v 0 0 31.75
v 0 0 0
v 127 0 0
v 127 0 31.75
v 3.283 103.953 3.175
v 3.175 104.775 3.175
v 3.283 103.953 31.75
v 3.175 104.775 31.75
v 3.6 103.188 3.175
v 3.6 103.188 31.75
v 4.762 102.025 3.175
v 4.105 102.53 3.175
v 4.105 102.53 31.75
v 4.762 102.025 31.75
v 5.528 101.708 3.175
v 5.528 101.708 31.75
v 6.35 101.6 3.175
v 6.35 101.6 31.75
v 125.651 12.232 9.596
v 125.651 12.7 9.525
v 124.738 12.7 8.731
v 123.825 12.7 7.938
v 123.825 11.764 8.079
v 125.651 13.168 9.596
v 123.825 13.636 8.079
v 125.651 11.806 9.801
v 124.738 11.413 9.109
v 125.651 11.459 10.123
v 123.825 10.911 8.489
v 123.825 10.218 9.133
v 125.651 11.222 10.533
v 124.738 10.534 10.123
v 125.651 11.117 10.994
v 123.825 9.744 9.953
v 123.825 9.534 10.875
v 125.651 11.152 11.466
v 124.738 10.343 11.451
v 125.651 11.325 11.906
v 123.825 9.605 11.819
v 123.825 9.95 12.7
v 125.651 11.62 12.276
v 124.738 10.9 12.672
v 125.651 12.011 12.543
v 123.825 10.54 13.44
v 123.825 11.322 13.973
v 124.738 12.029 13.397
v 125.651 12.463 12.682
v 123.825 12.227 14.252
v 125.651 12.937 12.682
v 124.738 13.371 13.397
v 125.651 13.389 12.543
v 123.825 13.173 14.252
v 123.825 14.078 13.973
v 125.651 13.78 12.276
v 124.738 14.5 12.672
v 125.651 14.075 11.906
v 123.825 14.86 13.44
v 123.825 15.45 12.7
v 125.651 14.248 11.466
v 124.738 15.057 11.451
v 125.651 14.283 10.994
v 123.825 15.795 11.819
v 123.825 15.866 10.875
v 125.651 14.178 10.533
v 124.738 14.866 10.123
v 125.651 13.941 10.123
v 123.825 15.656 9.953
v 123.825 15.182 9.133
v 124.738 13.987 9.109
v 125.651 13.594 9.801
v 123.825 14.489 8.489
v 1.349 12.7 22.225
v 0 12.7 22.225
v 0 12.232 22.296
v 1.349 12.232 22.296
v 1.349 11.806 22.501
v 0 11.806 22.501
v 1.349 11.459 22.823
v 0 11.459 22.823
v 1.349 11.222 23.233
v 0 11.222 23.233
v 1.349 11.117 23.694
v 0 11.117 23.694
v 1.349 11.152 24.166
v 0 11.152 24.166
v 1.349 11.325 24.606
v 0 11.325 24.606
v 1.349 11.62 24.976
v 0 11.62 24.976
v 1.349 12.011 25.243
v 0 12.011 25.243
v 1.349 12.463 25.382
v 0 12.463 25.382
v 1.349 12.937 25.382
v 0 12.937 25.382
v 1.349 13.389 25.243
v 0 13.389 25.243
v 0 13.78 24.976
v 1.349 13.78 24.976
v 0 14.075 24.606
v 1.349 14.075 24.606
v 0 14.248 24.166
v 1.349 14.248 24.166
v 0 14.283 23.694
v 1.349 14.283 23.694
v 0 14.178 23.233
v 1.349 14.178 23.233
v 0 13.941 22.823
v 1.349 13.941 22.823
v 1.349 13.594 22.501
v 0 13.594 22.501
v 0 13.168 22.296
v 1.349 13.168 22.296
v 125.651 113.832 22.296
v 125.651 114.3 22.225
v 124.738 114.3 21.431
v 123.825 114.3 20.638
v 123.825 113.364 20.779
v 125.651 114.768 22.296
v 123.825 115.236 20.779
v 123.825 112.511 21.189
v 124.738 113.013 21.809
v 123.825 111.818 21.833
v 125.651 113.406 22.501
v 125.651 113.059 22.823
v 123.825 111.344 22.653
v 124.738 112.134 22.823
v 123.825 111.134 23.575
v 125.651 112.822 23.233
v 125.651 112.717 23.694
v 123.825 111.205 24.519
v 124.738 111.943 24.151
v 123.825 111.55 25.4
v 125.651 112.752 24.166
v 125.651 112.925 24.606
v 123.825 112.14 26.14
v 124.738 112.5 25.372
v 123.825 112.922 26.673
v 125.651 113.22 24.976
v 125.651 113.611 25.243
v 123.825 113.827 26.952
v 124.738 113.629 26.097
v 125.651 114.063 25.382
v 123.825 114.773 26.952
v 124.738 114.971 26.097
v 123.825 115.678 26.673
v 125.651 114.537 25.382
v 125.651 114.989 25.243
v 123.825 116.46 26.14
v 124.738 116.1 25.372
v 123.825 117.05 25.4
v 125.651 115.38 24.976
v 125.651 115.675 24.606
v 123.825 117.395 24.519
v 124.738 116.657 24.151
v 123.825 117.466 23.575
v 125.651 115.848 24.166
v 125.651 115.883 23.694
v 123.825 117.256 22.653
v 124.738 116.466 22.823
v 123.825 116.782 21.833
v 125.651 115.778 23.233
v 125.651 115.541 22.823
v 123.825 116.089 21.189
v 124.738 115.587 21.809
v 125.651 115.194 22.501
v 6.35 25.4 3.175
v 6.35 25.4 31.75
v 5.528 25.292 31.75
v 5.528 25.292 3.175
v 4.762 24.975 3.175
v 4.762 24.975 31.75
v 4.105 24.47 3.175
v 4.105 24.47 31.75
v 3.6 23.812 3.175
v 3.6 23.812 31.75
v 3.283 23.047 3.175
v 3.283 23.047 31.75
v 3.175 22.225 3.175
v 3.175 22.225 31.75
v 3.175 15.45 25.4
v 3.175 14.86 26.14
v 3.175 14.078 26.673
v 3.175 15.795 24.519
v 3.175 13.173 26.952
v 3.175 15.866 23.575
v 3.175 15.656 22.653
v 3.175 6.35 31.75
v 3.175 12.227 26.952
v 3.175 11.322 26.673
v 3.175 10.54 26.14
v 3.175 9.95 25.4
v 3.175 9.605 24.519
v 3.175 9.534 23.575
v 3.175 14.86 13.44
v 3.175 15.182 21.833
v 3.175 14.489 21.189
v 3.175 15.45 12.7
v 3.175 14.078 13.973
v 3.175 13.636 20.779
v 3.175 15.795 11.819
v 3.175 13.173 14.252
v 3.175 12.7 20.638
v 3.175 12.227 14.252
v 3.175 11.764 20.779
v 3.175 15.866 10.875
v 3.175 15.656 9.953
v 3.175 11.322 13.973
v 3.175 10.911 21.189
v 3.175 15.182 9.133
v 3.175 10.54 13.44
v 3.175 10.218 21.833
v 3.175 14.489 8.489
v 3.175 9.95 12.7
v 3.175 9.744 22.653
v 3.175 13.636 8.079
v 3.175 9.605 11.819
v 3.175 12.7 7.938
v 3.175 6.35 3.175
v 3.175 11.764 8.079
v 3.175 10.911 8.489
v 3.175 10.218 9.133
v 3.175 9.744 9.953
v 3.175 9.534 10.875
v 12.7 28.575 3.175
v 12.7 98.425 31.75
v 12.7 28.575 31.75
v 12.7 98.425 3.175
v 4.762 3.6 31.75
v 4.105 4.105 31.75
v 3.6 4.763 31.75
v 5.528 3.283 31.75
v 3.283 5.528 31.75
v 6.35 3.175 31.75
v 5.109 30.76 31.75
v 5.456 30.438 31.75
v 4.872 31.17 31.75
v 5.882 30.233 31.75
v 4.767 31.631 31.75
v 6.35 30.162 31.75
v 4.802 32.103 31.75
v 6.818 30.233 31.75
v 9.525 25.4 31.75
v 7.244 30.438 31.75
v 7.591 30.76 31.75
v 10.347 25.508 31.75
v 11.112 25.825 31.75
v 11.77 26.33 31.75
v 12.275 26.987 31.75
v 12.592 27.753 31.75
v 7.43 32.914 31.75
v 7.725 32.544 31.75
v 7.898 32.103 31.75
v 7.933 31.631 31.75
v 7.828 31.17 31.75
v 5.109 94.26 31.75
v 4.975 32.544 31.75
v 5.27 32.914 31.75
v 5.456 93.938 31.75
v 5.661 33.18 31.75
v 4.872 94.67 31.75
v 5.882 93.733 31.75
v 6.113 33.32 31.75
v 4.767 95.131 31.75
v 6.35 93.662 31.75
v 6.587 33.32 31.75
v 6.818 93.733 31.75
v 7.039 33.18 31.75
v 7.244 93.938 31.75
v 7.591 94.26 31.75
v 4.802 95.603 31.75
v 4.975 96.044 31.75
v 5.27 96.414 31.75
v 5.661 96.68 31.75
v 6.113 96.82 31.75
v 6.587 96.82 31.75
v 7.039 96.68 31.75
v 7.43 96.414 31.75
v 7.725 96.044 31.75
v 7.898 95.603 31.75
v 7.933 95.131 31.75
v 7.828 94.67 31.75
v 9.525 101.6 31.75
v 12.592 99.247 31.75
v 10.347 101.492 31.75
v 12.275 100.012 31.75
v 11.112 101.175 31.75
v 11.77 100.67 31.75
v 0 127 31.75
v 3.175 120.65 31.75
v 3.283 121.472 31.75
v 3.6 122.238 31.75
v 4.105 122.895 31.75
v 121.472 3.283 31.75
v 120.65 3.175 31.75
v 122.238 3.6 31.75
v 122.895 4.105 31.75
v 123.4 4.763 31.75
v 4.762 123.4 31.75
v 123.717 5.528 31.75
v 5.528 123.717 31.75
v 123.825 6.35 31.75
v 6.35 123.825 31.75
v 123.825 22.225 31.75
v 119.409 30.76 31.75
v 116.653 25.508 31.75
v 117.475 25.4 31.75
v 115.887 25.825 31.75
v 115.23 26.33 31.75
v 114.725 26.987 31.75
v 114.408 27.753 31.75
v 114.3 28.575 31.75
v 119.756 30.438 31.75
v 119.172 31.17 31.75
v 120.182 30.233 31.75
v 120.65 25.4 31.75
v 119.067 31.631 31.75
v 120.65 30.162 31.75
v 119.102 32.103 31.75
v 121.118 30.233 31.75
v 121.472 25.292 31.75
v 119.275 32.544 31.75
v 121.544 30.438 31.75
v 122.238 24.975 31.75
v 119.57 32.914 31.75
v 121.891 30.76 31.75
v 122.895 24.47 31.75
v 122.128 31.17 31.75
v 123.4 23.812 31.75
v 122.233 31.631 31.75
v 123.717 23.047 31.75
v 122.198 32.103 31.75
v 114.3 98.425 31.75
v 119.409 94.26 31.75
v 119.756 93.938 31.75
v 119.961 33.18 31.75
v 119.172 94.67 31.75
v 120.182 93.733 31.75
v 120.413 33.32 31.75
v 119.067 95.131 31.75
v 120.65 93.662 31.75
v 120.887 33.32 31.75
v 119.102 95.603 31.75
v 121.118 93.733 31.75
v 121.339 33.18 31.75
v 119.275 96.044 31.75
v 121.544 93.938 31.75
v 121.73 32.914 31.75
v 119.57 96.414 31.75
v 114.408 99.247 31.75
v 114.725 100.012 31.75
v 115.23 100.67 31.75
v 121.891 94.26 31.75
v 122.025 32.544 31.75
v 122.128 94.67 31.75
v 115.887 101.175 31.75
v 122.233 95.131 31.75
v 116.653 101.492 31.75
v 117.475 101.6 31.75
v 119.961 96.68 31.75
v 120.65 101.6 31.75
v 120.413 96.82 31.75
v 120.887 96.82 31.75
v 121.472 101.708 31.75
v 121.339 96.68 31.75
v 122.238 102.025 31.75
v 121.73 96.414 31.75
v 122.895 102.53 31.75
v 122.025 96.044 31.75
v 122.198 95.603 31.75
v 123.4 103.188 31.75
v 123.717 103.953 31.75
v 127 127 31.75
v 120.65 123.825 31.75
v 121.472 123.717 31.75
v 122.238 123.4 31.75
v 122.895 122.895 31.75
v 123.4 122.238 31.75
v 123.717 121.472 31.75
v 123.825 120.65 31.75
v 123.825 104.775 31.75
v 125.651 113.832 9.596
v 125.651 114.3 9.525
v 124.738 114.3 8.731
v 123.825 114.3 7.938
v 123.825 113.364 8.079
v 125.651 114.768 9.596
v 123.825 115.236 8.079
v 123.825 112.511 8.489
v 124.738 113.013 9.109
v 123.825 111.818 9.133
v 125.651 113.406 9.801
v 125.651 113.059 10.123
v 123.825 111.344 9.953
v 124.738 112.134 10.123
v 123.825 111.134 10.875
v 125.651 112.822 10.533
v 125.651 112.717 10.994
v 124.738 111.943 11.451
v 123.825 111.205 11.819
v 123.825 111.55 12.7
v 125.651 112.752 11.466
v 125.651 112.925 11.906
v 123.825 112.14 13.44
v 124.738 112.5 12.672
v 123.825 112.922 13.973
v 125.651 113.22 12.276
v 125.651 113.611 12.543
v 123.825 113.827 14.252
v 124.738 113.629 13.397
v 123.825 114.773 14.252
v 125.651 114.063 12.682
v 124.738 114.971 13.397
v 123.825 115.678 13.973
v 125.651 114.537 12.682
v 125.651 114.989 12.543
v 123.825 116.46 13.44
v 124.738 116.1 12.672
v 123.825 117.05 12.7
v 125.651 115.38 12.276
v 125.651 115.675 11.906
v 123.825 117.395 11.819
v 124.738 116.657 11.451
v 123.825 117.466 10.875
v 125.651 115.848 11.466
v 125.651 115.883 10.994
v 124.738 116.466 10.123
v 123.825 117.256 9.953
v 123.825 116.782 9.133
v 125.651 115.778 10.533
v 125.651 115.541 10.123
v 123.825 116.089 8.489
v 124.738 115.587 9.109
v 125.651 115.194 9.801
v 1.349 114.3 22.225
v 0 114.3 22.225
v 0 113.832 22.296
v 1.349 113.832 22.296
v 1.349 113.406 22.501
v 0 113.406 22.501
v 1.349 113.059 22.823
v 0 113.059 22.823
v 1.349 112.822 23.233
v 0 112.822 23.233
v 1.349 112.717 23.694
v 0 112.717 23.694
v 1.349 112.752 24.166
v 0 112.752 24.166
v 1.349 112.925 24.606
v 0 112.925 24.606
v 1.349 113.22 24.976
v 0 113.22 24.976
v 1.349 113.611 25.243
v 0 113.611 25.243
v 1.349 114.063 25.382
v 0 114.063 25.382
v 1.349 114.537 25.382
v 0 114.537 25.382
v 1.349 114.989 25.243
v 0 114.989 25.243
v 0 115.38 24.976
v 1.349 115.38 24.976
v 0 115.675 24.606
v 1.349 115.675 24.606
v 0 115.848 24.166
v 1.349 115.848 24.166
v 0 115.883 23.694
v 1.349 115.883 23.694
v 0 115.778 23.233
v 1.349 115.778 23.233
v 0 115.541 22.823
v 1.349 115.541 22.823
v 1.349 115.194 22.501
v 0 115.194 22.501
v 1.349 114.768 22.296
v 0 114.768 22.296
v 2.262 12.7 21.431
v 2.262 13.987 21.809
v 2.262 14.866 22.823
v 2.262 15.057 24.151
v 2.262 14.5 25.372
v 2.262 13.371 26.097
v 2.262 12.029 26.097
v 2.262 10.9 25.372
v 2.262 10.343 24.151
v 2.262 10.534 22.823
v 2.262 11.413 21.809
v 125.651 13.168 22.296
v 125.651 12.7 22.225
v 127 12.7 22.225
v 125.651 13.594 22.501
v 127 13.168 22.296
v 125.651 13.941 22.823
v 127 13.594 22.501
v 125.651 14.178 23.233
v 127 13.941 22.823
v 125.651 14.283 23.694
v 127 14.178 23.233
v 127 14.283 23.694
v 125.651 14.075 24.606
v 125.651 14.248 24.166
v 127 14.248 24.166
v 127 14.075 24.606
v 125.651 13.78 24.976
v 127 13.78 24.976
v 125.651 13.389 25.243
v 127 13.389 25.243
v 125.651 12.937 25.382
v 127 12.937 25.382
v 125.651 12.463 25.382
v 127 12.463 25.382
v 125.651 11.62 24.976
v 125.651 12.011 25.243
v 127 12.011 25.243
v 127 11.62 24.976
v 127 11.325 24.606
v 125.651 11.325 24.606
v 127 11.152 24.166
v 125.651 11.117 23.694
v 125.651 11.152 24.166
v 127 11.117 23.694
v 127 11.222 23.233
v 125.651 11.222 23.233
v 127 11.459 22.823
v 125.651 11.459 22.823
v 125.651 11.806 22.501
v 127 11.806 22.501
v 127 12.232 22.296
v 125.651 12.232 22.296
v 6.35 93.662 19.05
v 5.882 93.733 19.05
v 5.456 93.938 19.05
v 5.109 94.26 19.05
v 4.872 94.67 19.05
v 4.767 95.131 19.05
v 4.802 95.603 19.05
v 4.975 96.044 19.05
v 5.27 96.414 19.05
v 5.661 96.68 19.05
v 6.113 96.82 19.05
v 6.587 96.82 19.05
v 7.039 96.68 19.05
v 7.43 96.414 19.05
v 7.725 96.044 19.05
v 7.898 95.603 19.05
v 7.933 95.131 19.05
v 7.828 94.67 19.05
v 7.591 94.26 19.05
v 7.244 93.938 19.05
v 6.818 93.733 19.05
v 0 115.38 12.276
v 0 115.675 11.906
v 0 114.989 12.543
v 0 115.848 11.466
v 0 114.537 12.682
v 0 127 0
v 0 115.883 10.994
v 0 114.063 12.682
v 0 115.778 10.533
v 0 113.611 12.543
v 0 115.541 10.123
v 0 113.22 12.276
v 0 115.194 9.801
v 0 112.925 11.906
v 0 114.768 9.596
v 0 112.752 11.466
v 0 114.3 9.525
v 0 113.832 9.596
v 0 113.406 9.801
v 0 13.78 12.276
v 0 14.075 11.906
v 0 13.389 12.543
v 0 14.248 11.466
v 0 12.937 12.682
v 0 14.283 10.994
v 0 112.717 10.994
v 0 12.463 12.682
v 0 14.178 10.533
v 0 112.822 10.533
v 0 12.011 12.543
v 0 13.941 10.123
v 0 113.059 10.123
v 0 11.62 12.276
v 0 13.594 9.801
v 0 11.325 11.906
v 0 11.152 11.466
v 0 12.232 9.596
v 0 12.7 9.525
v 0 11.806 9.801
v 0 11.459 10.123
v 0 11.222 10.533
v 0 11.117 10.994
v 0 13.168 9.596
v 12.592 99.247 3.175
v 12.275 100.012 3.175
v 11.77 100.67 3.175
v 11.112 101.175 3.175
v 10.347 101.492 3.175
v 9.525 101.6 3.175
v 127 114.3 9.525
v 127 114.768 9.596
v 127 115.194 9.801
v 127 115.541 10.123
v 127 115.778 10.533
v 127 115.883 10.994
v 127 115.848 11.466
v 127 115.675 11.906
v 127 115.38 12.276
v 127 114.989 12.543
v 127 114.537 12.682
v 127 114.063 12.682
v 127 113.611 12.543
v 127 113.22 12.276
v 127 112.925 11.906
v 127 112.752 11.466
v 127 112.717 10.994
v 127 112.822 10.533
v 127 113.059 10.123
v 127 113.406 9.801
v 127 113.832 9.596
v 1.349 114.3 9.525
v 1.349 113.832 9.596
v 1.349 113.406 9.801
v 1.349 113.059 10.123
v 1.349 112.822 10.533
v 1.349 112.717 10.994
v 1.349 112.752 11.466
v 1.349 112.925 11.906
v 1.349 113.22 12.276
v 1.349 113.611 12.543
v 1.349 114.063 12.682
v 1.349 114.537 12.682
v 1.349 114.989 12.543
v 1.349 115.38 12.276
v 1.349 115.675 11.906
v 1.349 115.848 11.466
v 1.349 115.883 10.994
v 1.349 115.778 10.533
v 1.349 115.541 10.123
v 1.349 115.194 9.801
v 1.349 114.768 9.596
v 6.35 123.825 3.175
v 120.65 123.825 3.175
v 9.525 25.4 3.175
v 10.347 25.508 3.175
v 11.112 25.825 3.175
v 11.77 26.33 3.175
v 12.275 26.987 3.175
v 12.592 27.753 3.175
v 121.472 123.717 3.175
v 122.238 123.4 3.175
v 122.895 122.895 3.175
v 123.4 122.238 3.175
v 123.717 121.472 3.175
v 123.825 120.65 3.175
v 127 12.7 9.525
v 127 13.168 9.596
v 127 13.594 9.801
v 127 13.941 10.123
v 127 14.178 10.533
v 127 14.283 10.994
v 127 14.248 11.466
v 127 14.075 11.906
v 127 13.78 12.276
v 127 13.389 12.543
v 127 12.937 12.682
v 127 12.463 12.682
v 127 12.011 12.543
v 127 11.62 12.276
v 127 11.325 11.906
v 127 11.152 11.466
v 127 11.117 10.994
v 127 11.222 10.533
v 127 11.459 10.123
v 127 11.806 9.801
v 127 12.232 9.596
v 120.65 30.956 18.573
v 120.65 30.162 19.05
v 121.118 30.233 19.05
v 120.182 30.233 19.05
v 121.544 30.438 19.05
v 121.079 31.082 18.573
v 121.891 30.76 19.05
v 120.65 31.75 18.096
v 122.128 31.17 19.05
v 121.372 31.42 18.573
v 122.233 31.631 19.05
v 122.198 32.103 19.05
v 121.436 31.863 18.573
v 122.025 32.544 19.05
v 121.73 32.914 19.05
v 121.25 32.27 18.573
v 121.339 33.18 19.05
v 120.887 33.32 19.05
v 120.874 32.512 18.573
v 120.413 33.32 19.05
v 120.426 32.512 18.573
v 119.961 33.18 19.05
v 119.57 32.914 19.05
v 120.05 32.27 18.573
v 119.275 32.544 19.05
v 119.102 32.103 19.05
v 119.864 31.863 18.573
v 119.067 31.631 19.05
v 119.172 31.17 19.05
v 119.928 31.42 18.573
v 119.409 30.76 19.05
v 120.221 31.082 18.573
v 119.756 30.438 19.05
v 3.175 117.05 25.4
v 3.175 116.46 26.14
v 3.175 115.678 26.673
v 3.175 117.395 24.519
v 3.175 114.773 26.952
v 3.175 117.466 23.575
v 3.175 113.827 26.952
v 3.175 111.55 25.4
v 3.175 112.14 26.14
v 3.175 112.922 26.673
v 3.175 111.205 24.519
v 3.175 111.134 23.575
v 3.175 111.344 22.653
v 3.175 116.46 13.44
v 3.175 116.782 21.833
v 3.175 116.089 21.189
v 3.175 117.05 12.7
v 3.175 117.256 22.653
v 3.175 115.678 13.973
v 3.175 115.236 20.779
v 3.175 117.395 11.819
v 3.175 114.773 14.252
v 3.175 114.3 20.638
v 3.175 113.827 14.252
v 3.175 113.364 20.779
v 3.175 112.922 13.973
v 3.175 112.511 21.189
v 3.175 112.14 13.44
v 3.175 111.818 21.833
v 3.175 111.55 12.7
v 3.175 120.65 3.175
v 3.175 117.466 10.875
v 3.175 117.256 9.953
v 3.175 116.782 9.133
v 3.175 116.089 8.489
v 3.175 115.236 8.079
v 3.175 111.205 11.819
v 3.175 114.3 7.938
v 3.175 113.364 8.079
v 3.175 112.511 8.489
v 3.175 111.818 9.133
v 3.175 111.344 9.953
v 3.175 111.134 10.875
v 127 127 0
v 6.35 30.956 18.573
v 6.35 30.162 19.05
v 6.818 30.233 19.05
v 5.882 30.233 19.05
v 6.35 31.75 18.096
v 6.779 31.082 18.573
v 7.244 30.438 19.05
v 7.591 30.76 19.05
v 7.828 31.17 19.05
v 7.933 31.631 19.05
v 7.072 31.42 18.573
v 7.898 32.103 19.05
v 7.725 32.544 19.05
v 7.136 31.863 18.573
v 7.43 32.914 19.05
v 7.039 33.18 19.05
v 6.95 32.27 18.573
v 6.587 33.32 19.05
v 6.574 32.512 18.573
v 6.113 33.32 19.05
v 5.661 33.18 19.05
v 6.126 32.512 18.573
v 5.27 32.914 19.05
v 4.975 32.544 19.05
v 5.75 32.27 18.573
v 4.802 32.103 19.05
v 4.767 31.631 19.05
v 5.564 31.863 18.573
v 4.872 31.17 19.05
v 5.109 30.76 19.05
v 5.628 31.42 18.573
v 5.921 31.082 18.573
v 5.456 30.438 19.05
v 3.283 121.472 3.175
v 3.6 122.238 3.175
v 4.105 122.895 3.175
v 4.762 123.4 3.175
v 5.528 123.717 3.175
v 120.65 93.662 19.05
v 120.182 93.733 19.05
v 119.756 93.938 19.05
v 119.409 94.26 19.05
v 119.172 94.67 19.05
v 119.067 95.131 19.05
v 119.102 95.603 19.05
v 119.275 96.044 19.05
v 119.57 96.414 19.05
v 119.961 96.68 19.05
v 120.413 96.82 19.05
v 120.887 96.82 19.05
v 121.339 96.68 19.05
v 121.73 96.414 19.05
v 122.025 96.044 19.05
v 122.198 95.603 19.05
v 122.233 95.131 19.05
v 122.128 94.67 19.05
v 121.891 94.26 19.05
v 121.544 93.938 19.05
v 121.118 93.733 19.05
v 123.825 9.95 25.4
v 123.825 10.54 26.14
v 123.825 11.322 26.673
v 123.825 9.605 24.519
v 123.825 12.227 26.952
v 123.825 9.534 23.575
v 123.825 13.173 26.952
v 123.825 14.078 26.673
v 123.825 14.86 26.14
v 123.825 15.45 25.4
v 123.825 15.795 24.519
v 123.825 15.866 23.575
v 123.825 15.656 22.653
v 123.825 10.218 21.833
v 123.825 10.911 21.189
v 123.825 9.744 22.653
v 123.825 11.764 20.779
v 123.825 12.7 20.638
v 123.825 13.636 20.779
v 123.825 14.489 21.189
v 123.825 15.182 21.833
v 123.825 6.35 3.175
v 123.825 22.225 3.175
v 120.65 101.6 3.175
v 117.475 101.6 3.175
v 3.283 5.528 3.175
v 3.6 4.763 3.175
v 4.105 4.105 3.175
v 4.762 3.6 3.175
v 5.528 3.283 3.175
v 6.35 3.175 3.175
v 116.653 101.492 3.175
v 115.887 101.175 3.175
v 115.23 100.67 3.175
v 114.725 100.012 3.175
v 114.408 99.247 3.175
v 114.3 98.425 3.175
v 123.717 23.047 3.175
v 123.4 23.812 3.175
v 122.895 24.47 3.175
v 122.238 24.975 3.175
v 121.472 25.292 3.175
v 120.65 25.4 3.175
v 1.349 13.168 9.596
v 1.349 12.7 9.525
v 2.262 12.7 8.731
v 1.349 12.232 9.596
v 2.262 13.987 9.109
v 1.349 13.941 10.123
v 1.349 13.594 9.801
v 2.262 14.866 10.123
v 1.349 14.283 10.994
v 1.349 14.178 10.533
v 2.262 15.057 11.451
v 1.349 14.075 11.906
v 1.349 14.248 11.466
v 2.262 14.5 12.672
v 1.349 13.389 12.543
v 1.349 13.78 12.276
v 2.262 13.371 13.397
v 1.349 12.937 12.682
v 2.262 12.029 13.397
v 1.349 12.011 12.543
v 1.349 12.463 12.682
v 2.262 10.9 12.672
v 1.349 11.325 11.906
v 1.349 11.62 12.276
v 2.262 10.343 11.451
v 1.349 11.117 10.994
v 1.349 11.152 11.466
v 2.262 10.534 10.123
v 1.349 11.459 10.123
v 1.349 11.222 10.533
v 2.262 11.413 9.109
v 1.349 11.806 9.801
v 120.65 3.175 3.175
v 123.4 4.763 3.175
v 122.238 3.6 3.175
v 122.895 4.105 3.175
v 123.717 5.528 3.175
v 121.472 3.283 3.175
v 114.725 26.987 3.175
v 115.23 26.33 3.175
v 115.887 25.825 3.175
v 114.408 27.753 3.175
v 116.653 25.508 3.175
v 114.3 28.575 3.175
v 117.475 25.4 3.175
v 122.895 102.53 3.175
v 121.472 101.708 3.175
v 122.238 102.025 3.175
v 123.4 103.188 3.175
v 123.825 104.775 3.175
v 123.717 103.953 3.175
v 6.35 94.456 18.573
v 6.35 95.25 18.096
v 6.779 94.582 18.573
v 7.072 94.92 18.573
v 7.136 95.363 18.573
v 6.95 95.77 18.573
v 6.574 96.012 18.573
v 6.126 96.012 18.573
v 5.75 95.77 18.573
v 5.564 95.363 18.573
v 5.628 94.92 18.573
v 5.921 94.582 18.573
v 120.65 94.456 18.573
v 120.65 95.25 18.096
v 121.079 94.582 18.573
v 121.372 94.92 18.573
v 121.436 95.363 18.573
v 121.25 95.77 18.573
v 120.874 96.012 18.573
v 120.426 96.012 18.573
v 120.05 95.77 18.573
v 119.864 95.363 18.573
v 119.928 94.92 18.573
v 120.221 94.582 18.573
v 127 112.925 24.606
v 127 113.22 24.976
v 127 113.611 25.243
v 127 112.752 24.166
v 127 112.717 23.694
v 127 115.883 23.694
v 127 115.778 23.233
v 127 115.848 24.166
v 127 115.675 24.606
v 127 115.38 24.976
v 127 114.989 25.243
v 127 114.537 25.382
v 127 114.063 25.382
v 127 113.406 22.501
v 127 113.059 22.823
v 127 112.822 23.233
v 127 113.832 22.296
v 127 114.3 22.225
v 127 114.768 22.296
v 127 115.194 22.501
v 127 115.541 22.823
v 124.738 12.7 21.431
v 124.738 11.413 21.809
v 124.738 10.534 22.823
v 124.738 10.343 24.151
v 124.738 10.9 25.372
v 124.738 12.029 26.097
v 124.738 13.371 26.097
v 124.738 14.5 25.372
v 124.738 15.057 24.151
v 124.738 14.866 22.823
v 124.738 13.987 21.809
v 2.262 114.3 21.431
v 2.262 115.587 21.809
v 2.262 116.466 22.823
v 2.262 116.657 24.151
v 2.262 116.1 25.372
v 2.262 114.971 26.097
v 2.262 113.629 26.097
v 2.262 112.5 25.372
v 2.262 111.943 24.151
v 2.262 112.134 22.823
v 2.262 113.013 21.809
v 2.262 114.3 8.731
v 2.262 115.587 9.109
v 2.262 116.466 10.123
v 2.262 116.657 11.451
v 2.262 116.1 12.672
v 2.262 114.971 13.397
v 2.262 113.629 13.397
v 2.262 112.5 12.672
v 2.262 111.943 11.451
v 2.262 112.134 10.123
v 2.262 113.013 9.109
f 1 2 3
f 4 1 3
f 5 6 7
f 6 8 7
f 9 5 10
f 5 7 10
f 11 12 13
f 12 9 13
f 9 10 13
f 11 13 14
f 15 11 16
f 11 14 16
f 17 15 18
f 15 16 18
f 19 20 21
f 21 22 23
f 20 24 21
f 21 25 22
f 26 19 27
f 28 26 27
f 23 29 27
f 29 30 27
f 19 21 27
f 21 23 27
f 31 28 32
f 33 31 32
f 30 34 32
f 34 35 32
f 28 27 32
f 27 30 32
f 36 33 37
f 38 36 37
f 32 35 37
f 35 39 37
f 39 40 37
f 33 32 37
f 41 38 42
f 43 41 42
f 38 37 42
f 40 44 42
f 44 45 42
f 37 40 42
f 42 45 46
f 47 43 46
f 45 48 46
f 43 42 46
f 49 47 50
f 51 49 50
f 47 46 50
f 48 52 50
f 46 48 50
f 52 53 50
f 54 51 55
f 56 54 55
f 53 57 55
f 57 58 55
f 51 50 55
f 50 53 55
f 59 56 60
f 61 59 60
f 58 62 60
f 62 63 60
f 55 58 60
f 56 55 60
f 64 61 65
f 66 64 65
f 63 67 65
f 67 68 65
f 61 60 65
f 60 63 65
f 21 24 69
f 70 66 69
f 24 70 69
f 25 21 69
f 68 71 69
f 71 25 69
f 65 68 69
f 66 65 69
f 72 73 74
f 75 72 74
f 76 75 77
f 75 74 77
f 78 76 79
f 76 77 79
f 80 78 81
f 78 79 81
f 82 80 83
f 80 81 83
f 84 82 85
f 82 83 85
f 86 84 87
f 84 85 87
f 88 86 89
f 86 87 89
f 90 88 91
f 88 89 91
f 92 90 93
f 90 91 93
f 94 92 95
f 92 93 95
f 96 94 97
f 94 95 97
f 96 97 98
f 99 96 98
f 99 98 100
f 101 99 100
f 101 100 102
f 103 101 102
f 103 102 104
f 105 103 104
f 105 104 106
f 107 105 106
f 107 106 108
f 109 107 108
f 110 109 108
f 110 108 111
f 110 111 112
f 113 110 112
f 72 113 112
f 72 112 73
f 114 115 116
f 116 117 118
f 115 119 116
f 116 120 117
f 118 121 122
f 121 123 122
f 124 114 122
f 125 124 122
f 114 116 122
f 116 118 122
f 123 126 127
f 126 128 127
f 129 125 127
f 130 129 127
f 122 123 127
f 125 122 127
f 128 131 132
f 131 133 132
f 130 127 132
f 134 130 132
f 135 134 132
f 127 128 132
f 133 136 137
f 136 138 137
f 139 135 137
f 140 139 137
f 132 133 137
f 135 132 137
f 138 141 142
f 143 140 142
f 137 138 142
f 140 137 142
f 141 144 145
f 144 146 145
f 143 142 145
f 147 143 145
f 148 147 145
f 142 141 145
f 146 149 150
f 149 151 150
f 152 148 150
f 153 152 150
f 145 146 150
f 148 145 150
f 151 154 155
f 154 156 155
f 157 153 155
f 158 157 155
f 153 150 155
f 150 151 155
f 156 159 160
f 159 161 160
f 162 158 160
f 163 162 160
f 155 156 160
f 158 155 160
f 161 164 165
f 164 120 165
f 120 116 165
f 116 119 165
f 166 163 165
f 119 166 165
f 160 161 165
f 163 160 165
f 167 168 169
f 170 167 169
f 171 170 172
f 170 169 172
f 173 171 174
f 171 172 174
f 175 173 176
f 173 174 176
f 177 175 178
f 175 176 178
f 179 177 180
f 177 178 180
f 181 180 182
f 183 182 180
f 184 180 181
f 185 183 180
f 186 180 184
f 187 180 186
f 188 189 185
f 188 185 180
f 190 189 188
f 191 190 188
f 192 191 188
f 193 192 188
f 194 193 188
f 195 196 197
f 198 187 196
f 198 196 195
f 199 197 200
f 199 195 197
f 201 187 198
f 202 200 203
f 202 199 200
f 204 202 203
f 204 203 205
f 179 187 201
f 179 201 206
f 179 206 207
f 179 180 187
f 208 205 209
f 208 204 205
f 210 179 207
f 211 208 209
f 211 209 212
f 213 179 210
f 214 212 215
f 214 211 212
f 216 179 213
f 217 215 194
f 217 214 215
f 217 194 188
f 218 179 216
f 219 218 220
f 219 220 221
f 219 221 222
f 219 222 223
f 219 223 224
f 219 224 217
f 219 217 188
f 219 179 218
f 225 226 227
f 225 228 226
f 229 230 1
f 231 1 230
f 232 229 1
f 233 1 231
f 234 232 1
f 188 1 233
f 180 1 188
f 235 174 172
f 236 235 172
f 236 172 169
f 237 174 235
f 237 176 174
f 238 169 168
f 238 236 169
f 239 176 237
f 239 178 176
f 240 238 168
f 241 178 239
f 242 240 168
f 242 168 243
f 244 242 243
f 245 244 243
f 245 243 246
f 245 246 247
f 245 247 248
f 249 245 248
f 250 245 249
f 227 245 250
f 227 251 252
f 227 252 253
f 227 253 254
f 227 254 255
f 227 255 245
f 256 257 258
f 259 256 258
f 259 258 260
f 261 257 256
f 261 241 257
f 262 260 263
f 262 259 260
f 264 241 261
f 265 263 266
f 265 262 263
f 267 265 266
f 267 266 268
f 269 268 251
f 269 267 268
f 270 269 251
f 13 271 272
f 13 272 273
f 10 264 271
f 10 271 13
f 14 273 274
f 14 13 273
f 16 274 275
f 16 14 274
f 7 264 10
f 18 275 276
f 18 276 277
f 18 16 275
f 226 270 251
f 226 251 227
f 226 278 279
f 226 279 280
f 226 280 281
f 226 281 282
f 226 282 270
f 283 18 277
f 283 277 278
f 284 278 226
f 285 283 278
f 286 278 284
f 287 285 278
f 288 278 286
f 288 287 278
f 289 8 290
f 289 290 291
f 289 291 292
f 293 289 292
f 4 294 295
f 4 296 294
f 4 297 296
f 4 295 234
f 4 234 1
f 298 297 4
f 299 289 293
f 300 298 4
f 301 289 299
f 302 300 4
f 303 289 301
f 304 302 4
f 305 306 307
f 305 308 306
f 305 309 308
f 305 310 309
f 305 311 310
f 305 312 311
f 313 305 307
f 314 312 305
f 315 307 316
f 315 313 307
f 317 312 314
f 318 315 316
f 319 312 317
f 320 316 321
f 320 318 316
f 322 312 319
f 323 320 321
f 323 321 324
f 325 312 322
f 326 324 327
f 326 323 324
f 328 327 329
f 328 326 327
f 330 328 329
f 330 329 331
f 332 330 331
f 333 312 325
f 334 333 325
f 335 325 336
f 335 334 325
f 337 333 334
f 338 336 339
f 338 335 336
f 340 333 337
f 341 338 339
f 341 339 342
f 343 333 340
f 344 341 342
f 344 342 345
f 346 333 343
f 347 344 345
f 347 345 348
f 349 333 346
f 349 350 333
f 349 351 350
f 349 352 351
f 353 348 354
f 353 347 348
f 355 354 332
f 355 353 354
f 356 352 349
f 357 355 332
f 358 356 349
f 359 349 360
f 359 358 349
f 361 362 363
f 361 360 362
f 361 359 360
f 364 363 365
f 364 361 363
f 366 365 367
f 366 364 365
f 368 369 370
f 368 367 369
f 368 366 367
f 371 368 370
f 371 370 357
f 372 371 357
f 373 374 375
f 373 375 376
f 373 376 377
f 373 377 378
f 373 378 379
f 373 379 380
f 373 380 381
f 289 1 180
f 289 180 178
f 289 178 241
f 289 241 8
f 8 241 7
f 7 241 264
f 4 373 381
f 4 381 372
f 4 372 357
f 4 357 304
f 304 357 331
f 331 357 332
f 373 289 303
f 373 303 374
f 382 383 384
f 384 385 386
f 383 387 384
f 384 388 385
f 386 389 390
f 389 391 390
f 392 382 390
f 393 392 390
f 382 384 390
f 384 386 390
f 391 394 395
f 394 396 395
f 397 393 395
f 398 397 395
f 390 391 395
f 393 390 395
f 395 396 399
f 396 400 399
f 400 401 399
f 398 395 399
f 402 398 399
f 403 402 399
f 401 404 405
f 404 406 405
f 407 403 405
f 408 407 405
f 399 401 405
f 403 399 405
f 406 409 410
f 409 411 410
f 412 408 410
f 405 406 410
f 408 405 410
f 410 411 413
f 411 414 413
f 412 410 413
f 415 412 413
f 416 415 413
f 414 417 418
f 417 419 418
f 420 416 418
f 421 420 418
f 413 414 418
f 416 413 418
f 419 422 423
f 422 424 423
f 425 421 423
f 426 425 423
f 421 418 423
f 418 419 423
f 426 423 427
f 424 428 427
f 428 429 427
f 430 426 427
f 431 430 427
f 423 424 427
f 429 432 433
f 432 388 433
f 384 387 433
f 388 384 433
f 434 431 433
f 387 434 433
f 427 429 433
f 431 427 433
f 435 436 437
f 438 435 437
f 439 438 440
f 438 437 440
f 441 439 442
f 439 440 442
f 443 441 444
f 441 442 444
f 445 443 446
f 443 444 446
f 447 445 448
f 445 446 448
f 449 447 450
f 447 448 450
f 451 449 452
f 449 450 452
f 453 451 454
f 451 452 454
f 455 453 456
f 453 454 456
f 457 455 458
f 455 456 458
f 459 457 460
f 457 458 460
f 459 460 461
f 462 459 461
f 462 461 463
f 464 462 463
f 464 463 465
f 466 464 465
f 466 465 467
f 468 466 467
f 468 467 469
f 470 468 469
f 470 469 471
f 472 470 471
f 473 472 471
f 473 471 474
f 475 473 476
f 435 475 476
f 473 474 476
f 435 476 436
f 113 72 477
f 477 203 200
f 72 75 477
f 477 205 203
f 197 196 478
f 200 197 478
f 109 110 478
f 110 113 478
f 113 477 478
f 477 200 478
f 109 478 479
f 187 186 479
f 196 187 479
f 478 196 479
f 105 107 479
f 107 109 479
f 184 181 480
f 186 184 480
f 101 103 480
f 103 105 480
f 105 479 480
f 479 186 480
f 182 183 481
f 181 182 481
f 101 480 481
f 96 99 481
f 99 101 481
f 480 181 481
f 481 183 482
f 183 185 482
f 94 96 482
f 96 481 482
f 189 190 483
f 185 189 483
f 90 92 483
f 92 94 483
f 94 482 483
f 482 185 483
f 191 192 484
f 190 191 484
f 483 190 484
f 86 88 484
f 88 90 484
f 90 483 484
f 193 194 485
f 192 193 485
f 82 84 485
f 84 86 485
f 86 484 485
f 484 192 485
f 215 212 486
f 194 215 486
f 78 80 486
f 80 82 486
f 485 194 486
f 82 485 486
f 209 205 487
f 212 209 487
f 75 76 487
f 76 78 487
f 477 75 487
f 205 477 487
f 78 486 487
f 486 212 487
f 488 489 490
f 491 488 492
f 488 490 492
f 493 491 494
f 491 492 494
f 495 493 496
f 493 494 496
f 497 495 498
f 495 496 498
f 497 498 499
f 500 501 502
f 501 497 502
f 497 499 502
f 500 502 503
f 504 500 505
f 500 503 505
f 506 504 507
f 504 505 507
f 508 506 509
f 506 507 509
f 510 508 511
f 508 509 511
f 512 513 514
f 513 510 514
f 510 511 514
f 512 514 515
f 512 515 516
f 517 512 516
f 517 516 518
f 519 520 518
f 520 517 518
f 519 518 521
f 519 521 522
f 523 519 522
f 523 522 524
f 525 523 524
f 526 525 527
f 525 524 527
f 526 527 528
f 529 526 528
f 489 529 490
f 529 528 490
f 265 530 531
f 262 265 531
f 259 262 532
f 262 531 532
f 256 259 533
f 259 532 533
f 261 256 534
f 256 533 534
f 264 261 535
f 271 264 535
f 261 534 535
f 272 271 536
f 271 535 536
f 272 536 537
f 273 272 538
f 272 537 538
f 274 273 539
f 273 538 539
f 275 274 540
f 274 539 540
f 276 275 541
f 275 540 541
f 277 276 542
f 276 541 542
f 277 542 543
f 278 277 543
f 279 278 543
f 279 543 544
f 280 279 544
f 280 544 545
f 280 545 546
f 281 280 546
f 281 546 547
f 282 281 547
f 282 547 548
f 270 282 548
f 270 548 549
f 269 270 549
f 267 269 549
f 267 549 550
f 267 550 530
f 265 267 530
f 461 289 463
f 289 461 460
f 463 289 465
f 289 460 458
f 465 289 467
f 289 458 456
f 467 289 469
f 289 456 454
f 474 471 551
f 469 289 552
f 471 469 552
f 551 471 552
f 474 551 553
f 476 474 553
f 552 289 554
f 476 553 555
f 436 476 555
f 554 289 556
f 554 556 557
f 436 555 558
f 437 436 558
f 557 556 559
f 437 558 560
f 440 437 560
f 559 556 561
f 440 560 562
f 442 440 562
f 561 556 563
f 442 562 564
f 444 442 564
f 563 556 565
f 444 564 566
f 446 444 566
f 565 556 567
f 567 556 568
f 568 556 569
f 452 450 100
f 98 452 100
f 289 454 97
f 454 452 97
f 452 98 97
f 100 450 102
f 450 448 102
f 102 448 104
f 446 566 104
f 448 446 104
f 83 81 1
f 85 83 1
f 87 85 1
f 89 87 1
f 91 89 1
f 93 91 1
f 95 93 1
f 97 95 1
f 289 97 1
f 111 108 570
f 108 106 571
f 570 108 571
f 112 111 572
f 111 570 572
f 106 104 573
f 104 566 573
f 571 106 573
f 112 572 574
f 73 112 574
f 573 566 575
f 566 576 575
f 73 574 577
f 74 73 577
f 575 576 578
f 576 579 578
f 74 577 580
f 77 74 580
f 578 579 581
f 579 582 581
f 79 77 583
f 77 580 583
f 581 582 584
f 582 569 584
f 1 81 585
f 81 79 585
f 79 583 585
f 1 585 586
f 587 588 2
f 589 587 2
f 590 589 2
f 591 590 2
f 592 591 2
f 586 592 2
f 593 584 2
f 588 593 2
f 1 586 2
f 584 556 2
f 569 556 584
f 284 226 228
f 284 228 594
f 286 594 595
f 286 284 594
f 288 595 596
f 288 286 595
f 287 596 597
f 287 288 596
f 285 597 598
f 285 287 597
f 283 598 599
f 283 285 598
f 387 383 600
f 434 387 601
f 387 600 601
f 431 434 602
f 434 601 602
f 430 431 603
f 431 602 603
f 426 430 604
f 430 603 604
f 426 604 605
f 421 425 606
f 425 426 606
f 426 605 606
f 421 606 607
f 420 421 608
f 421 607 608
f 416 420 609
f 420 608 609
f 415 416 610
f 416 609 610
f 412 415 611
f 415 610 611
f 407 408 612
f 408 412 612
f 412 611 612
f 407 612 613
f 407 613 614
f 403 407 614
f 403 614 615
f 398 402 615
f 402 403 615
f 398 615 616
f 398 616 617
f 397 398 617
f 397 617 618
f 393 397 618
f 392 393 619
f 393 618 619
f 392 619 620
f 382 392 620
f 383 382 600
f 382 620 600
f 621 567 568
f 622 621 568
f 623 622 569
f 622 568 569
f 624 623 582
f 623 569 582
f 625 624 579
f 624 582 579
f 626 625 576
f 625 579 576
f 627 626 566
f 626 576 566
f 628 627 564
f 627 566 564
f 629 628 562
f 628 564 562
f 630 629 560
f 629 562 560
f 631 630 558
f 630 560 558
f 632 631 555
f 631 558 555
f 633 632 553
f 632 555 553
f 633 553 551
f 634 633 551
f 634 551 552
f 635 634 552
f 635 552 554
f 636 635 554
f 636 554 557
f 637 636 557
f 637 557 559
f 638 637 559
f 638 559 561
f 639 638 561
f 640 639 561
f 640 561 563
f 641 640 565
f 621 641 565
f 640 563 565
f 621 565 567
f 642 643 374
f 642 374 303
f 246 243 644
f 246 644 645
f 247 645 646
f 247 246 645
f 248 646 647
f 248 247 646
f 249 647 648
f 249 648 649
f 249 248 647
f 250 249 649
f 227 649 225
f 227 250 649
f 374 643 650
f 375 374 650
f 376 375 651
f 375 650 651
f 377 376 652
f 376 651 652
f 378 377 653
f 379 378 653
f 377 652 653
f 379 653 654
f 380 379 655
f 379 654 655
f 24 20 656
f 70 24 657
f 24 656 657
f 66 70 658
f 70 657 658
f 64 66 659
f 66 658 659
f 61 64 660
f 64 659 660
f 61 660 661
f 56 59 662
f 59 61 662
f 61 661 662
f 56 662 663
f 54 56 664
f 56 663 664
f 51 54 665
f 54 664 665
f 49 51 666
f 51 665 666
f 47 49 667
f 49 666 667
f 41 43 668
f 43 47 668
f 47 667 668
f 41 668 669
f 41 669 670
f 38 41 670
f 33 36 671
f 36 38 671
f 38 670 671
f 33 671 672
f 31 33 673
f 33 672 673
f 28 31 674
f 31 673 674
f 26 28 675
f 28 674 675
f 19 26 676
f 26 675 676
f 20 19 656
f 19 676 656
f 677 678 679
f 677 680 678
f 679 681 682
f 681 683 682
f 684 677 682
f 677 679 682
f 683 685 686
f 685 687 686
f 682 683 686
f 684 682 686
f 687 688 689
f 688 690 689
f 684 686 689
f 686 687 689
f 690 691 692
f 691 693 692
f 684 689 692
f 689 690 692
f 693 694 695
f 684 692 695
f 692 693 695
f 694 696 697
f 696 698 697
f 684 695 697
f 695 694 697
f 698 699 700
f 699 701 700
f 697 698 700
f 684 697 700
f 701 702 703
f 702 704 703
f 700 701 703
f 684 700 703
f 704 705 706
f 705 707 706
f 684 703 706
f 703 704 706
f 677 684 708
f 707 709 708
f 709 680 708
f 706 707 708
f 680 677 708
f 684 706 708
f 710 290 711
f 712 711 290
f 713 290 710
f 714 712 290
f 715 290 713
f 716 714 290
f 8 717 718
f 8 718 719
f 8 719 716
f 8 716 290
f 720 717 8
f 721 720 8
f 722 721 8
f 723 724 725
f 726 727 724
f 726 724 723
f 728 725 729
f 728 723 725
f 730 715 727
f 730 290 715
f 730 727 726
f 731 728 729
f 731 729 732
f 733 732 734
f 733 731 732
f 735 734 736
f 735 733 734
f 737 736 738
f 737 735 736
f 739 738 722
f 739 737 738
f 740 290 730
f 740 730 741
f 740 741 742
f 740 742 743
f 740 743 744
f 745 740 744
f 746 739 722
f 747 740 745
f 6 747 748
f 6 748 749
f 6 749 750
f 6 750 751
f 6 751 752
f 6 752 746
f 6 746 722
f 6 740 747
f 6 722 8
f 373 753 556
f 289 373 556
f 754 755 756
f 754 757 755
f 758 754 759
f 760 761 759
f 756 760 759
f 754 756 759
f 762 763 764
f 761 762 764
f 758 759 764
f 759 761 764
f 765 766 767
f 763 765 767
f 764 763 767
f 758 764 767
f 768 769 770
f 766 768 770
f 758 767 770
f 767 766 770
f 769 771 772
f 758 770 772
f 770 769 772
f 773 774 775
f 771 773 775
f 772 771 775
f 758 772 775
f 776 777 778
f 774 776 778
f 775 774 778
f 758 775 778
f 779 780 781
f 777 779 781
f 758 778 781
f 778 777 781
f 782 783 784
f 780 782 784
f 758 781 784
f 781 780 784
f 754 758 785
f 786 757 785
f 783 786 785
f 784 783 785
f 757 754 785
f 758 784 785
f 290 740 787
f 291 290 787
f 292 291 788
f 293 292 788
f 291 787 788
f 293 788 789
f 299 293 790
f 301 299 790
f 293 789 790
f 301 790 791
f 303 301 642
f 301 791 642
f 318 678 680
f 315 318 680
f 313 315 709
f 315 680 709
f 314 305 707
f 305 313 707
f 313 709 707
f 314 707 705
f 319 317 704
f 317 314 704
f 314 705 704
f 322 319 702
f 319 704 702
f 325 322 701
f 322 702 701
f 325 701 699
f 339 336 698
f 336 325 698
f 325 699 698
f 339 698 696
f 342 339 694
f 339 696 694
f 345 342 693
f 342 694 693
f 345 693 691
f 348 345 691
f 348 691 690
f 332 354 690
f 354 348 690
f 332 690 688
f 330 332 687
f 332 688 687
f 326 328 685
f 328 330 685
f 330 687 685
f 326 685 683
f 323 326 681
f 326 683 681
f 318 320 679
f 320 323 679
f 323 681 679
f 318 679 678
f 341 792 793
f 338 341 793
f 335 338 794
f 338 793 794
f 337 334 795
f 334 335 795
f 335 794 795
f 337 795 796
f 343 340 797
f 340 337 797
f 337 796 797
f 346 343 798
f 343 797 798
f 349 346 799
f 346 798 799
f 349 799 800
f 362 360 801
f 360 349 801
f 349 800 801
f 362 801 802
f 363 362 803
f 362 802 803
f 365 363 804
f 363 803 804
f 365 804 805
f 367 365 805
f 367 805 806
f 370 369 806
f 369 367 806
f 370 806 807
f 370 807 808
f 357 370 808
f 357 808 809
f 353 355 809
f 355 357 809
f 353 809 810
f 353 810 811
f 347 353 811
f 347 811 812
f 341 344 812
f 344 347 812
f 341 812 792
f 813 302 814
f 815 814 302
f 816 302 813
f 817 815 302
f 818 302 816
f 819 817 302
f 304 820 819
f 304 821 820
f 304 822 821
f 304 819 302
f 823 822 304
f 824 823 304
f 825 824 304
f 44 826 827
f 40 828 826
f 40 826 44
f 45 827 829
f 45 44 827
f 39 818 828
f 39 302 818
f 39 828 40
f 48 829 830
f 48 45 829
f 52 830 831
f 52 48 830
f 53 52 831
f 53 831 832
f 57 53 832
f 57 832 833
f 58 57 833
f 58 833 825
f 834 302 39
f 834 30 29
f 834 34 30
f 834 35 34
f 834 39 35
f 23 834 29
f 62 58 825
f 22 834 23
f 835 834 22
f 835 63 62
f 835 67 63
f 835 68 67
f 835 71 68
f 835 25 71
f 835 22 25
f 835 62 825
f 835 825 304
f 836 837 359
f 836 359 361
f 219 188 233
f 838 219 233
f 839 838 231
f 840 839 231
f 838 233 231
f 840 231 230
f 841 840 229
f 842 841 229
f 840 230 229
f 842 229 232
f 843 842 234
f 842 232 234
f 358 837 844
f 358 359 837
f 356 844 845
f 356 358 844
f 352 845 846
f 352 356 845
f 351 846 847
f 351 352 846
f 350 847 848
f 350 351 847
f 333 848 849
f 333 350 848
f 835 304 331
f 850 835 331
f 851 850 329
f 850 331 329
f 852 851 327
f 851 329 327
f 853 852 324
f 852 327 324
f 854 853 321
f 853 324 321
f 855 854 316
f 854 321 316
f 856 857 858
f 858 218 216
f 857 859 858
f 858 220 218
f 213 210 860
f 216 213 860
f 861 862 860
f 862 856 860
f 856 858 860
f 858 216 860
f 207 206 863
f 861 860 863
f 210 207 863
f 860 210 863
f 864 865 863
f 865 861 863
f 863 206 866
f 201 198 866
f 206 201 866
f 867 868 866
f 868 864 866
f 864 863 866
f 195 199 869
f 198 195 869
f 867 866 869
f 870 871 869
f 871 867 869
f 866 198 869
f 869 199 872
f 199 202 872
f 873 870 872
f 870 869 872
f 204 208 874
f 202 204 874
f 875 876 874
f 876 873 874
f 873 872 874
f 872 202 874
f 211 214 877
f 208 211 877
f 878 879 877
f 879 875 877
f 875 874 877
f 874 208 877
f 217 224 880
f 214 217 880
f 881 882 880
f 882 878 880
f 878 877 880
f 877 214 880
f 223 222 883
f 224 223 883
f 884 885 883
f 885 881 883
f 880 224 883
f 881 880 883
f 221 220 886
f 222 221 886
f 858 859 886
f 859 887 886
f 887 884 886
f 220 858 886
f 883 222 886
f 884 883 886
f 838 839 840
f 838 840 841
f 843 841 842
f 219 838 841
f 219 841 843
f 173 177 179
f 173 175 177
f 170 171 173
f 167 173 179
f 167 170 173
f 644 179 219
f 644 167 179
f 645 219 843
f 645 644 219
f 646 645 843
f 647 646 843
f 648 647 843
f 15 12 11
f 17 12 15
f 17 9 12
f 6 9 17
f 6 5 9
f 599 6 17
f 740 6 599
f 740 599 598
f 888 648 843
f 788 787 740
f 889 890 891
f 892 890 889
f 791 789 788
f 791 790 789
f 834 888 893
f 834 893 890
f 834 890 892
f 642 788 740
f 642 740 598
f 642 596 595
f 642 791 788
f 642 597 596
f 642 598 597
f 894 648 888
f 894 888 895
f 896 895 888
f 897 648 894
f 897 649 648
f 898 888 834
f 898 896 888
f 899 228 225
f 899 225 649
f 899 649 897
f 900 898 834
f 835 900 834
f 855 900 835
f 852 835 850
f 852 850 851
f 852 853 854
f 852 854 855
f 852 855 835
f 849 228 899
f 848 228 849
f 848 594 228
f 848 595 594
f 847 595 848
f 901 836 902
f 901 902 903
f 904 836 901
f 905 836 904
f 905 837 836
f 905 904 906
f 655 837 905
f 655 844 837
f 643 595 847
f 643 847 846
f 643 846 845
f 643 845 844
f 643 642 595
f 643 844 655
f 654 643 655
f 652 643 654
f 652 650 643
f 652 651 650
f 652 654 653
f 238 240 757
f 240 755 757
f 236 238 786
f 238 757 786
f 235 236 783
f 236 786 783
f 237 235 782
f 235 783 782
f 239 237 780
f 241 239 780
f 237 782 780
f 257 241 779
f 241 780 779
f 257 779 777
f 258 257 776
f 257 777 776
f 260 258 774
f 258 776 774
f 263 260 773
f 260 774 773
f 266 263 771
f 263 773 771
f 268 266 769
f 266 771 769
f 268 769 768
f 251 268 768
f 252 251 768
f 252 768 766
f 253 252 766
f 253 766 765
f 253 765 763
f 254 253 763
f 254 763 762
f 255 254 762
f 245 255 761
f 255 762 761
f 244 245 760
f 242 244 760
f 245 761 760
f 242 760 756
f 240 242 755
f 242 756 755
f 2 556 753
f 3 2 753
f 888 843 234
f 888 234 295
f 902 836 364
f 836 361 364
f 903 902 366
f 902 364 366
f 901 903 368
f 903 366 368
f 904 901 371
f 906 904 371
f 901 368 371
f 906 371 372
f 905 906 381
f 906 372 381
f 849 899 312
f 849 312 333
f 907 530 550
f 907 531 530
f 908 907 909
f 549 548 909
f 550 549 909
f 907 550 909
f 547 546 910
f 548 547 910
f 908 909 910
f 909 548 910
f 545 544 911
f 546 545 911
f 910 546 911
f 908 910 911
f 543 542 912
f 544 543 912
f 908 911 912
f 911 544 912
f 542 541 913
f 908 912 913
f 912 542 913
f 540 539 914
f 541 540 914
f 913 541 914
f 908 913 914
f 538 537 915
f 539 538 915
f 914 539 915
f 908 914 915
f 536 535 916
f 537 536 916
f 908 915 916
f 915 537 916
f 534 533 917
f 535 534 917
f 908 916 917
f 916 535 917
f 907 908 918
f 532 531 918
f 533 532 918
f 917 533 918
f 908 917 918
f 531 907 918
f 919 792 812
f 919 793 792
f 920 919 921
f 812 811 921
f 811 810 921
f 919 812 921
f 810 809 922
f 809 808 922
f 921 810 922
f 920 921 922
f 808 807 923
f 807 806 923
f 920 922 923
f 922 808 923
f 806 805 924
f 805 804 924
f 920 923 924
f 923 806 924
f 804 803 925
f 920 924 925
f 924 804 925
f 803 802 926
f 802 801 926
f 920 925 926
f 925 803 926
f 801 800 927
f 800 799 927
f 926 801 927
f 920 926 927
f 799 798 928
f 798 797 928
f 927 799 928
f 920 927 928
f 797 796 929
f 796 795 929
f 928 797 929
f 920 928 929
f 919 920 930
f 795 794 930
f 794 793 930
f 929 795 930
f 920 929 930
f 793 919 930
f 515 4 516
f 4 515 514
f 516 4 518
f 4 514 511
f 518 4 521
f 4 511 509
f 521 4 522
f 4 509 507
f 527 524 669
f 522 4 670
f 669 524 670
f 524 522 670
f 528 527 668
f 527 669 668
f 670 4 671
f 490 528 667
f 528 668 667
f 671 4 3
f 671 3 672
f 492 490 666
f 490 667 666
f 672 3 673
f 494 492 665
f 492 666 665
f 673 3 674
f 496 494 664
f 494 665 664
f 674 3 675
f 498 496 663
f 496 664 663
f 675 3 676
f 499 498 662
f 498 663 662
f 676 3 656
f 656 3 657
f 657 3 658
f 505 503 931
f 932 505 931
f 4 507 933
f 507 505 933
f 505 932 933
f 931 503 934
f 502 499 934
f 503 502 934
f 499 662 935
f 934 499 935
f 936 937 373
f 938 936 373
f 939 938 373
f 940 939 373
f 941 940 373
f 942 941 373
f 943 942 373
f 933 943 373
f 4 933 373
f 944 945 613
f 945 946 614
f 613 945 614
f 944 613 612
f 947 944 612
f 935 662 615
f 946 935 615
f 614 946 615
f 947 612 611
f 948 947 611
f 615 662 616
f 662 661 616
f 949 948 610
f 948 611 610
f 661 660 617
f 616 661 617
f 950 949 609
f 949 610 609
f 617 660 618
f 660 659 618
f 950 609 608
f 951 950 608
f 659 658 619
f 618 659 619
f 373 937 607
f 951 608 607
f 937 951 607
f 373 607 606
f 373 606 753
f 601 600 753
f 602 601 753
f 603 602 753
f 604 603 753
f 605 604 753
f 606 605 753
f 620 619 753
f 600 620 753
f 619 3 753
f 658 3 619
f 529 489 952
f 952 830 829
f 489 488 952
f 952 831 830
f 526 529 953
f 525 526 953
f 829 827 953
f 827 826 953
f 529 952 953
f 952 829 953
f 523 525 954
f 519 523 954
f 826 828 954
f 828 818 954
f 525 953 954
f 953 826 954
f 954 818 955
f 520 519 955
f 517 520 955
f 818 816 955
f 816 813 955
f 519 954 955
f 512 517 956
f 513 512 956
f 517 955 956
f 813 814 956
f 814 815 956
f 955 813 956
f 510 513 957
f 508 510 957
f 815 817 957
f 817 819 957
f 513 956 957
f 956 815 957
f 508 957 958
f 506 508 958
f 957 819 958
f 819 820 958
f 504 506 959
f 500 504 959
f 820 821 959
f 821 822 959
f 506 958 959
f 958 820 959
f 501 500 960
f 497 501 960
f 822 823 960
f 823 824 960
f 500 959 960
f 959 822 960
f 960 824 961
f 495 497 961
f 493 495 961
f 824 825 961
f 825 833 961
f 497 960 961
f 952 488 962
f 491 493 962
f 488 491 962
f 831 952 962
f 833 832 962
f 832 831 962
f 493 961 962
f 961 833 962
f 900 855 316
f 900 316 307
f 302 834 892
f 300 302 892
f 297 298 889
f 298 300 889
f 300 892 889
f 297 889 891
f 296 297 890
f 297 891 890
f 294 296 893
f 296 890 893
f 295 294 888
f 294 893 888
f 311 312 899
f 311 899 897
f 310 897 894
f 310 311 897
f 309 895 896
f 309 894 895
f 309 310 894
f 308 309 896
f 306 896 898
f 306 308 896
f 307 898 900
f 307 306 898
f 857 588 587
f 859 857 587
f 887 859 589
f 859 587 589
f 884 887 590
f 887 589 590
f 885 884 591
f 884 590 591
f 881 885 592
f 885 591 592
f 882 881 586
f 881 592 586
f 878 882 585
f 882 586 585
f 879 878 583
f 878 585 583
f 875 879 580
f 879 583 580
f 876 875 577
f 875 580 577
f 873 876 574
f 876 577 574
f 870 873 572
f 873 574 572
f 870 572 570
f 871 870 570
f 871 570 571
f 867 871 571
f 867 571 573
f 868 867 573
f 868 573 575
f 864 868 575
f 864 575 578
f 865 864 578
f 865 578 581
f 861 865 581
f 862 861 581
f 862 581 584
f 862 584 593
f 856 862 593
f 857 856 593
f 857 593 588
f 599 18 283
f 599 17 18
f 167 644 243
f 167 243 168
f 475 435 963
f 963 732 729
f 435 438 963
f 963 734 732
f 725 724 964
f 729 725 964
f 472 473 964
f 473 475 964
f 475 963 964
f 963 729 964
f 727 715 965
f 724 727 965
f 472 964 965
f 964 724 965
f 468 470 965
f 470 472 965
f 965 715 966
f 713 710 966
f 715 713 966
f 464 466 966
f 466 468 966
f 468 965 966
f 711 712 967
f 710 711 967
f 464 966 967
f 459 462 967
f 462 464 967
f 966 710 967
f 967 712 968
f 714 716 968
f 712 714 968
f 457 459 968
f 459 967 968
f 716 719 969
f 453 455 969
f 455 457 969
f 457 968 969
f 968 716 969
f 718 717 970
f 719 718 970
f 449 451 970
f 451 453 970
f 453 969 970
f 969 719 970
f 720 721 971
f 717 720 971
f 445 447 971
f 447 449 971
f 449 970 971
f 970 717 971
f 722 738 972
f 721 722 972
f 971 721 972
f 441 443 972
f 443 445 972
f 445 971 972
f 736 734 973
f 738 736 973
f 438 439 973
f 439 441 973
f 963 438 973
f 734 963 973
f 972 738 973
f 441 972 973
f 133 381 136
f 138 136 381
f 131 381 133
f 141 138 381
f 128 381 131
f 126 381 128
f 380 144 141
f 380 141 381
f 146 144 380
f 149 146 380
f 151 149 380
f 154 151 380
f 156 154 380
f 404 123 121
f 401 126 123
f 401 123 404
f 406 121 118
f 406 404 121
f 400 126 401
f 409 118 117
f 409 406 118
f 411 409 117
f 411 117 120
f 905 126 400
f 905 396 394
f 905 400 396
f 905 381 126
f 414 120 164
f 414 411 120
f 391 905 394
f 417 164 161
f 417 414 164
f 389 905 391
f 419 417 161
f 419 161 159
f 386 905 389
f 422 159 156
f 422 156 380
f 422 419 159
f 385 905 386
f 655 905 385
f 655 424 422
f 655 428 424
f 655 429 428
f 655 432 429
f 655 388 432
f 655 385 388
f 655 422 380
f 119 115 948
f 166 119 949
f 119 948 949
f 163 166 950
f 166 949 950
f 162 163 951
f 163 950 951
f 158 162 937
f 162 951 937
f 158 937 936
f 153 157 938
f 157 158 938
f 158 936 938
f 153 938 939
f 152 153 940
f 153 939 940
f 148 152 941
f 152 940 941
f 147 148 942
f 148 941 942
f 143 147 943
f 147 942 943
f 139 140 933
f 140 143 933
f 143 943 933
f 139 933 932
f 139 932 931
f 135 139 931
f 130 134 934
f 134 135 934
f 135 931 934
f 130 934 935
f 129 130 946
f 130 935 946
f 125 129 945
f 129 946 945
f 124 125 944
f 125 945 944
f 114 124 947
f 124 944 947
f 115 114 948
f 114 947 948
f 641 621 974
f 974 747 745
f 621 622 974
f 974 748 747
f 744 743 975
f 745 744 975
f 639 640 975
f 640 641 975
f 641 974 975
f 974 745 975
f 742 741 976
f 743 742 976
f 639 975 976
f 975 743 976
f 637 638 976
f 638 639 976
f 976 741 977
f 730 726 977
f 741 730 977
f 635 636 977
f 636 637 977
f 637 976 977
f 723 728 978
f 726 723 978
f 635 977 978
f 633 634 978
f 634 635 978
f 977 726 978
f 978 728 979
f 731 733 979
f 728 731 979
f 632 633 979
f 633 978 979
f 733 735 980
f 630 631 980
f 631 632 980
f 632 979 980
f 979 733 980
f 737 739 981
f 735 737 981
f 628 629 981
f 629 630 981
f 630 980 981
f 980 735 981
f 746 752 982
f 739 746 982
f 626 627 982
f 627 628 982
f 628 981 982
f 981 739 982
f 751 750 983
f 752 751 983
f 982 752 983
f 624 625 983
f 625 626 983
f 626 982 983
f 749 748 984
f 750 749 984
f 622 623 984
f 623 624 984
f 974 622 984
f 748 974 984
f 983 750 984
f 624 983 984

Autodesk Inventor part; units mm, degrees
ref_plane "YZ Plane" through (0, 0, 0) normal (1, 0, 0) x (0, 1, 0)
ref_plane "XZ Plane" through (0, 0, 0) normal (0, 1, 0) x (-1, 0, 0)
sketch "Sketch1" plane through (0, 0, 0) normal (0, 0, 1) x (1, 0, 0)
  line L0 (0, 0) -> (127, 0)
  line L1 (127, 0) -> (127, 127)
  line L2 (127, 127) -> (0, 127)
  line L3 (0, 127) -> (0, 0)
  dimension "d0" = 127
  dimension "d1" = 127
extrude "Extrusion1" add sketch "Sketch1" along normal blind 31.75
shell "Shell1" thickness 3.175 removed faces 1 at (42.3333, 84.6667, 31.75)
sketch "Sketch3" plane through (3.175, 3.175, 3.175) normal (1, 0, 0) x (0, 0, -1)
  line L0 (0, 0) -> (-28.575, 0) construction
  line L1 (-14.2875, 0) -> (-14.2875, 120.65) construction
  line L2 (0, 120.65) -> (-28.575, 120.65) construction
  line L3 (-14.2875, 120.65) -> (-20.6375, 120.65) construction
  line L4 (-20.6375, 120.65) -> (-20.6375, 111.125) construction
  line L5 (-20.6375, 111.125) -> (-14.2875, 111.125) construction
  line L6 (-14.2875, 111.125) -> (-14.2875, 120.65) construction
  line L7 (-14.2875, 120.65) -> (-7.9375, 120.65) construction
  line L8 (-7.9375, 120.65) -> (-7.9375, 111.125) construction
  line L9 (-7.9375, 111.125) -> (-14.2875, 111.125) construction
  line L10 (-14.2875, 111.125) -> (-14.2875, 120.65) construction
  line L11 (-14.2875, 0) -> (-20.6375, 0) construction
  line L12 (-20.6375, 0) -> (-20.6375, 9.525) construction
  line L13 (-20.6375, 9.525) -> (-14.2875, 9.525) construction
  line L14 (-14.2875, 9.525) -> (-14.2875, 0) construction
  line L15 (-14.2875, 0) -> (-7.9375, 0) construction
  line L16 (-7.9375, 0) -> (-7.9375, 9.525) construction
  line L17 (-7.9375, 9.525) -> (-14.2875, 9.525) construction
  line L18 (-14.2875, 9.525) -> (-14.2875, 0) construction
  point P0 (3.175, -3.175)
  dimension "d5" = 6.35
  dimension "d6" = 9.525
  dimension "d7" = 6.35
  dimension "d8" = 6.35
  dimension "d9" = 9.525
  dimension "d10" = 6.35
  dimension "d11" = 9.525
hole "Hole1" at (3.175, 12.7, 23.8125) at (3.175, 12.7, 11.1125) at (3.175, 114.3, 23.8125) at (3.175, 114.3, 11.1125) direction (-1, 0, 0) diameter 3.175 depth 15.6718 tip angle 118 countersink diameter 6.35 countersink angle 82
ref_plane "Work Plane1" through (63.5, 0, 0) normal (1, 0, 0) x (0, 0, -1)
sketch "Sketch4" plane through (3.175, 3.175, 3.175) normal (0, 0, 1) x (1, 0, 0)
  line L0 (0, 0) -> (0, 120.65) construction
  line L1 (0, 120.65) -> (0, 98.425) construction
  line L2 (0, 0) -> (120.65, 0) construction
  line L3 (0, 0) -> (0, 22.225) construction
  line L4 (0, 98.425) -> (9.525, 98.425)
  line L5 (9.525, 98.425) -> (9.525, 22.225)
  line L6 (9.525, 22.225) -> (0, 22.225)
  line L7 (0, 22.225) -> (0, 98.425)
  point P0 (-3.175, -3.175)
  dimension "d19" = 22.225
  dimension "d20" = 22.225
  dimension "d21" = 9.525
extrude "Extrusion2" add sketch "Sketch4" along normal up to surface (28.575 mm away)
sketch "Sketch5" plane through (0, 0, 31.75) normal (0, 0, 1) x (1, 0, 0)
  line L0 (12.7, 101.6) -> (12.7, 25.4) construction
  line L1 (12.7, 25.4) -> (6.35, 25.4) construction
  line L2 (6.35, 25.4) -> (6.35, 31.75) construction
  line L3 (6.35, 31.75) -> (12.7, 31.75) construction
  line L4 (12.7, 31.75) -> (12.7, 25.4) construction
  line L5 (12.7, 101.6) -> (6.35, 101.6) construction
  line L6 (6.35, 101.6) -> (6.35, 95.25) construction
  line L7 (6.35, 95.25) -> (12.7, 95.25) construction
  line L8 (12.7, 95.25) -> (12.7, 101.6) construction
  point P0 (0, 0)
  dimension "d24" = 6.35
  dimension "d25" = 6.35
  dimension "d26" = 6.35
  dimension "d27" = 6.35
hole "Hole2" at (6.35, 95.25, 31.75) at (6.35, 31.75, 31.75) direction (0, 0, -1) diameter 3.175 depth 12.7 tip angle 118
mirror "Mirror2" about plane through (63.5, 0, 0) normal (1, 0, 0) of "Hole1", "Extrusion2", "Hole2"
fillet "Fillet1" radius 3.175 12 edges at (3.175, 123.825, 17.4625) (12.7, 101.6, 17.4625) (3.175, 101.6, 17.4625) (12.7, 25.4, 17.4625) (3.175, 25.4, 17.4625) (3.175, 3.175, 17.4625) (123.825, 3.175, 17.4625) (123.825, 25.4, 17.4625) (114.3, 25.4, 17.4625) (114.3, 101.6, 17.4625) (123.825, 101.6, 17.4625) (123.825, 123.825, 17.4625)
properties part number "wheel core"
